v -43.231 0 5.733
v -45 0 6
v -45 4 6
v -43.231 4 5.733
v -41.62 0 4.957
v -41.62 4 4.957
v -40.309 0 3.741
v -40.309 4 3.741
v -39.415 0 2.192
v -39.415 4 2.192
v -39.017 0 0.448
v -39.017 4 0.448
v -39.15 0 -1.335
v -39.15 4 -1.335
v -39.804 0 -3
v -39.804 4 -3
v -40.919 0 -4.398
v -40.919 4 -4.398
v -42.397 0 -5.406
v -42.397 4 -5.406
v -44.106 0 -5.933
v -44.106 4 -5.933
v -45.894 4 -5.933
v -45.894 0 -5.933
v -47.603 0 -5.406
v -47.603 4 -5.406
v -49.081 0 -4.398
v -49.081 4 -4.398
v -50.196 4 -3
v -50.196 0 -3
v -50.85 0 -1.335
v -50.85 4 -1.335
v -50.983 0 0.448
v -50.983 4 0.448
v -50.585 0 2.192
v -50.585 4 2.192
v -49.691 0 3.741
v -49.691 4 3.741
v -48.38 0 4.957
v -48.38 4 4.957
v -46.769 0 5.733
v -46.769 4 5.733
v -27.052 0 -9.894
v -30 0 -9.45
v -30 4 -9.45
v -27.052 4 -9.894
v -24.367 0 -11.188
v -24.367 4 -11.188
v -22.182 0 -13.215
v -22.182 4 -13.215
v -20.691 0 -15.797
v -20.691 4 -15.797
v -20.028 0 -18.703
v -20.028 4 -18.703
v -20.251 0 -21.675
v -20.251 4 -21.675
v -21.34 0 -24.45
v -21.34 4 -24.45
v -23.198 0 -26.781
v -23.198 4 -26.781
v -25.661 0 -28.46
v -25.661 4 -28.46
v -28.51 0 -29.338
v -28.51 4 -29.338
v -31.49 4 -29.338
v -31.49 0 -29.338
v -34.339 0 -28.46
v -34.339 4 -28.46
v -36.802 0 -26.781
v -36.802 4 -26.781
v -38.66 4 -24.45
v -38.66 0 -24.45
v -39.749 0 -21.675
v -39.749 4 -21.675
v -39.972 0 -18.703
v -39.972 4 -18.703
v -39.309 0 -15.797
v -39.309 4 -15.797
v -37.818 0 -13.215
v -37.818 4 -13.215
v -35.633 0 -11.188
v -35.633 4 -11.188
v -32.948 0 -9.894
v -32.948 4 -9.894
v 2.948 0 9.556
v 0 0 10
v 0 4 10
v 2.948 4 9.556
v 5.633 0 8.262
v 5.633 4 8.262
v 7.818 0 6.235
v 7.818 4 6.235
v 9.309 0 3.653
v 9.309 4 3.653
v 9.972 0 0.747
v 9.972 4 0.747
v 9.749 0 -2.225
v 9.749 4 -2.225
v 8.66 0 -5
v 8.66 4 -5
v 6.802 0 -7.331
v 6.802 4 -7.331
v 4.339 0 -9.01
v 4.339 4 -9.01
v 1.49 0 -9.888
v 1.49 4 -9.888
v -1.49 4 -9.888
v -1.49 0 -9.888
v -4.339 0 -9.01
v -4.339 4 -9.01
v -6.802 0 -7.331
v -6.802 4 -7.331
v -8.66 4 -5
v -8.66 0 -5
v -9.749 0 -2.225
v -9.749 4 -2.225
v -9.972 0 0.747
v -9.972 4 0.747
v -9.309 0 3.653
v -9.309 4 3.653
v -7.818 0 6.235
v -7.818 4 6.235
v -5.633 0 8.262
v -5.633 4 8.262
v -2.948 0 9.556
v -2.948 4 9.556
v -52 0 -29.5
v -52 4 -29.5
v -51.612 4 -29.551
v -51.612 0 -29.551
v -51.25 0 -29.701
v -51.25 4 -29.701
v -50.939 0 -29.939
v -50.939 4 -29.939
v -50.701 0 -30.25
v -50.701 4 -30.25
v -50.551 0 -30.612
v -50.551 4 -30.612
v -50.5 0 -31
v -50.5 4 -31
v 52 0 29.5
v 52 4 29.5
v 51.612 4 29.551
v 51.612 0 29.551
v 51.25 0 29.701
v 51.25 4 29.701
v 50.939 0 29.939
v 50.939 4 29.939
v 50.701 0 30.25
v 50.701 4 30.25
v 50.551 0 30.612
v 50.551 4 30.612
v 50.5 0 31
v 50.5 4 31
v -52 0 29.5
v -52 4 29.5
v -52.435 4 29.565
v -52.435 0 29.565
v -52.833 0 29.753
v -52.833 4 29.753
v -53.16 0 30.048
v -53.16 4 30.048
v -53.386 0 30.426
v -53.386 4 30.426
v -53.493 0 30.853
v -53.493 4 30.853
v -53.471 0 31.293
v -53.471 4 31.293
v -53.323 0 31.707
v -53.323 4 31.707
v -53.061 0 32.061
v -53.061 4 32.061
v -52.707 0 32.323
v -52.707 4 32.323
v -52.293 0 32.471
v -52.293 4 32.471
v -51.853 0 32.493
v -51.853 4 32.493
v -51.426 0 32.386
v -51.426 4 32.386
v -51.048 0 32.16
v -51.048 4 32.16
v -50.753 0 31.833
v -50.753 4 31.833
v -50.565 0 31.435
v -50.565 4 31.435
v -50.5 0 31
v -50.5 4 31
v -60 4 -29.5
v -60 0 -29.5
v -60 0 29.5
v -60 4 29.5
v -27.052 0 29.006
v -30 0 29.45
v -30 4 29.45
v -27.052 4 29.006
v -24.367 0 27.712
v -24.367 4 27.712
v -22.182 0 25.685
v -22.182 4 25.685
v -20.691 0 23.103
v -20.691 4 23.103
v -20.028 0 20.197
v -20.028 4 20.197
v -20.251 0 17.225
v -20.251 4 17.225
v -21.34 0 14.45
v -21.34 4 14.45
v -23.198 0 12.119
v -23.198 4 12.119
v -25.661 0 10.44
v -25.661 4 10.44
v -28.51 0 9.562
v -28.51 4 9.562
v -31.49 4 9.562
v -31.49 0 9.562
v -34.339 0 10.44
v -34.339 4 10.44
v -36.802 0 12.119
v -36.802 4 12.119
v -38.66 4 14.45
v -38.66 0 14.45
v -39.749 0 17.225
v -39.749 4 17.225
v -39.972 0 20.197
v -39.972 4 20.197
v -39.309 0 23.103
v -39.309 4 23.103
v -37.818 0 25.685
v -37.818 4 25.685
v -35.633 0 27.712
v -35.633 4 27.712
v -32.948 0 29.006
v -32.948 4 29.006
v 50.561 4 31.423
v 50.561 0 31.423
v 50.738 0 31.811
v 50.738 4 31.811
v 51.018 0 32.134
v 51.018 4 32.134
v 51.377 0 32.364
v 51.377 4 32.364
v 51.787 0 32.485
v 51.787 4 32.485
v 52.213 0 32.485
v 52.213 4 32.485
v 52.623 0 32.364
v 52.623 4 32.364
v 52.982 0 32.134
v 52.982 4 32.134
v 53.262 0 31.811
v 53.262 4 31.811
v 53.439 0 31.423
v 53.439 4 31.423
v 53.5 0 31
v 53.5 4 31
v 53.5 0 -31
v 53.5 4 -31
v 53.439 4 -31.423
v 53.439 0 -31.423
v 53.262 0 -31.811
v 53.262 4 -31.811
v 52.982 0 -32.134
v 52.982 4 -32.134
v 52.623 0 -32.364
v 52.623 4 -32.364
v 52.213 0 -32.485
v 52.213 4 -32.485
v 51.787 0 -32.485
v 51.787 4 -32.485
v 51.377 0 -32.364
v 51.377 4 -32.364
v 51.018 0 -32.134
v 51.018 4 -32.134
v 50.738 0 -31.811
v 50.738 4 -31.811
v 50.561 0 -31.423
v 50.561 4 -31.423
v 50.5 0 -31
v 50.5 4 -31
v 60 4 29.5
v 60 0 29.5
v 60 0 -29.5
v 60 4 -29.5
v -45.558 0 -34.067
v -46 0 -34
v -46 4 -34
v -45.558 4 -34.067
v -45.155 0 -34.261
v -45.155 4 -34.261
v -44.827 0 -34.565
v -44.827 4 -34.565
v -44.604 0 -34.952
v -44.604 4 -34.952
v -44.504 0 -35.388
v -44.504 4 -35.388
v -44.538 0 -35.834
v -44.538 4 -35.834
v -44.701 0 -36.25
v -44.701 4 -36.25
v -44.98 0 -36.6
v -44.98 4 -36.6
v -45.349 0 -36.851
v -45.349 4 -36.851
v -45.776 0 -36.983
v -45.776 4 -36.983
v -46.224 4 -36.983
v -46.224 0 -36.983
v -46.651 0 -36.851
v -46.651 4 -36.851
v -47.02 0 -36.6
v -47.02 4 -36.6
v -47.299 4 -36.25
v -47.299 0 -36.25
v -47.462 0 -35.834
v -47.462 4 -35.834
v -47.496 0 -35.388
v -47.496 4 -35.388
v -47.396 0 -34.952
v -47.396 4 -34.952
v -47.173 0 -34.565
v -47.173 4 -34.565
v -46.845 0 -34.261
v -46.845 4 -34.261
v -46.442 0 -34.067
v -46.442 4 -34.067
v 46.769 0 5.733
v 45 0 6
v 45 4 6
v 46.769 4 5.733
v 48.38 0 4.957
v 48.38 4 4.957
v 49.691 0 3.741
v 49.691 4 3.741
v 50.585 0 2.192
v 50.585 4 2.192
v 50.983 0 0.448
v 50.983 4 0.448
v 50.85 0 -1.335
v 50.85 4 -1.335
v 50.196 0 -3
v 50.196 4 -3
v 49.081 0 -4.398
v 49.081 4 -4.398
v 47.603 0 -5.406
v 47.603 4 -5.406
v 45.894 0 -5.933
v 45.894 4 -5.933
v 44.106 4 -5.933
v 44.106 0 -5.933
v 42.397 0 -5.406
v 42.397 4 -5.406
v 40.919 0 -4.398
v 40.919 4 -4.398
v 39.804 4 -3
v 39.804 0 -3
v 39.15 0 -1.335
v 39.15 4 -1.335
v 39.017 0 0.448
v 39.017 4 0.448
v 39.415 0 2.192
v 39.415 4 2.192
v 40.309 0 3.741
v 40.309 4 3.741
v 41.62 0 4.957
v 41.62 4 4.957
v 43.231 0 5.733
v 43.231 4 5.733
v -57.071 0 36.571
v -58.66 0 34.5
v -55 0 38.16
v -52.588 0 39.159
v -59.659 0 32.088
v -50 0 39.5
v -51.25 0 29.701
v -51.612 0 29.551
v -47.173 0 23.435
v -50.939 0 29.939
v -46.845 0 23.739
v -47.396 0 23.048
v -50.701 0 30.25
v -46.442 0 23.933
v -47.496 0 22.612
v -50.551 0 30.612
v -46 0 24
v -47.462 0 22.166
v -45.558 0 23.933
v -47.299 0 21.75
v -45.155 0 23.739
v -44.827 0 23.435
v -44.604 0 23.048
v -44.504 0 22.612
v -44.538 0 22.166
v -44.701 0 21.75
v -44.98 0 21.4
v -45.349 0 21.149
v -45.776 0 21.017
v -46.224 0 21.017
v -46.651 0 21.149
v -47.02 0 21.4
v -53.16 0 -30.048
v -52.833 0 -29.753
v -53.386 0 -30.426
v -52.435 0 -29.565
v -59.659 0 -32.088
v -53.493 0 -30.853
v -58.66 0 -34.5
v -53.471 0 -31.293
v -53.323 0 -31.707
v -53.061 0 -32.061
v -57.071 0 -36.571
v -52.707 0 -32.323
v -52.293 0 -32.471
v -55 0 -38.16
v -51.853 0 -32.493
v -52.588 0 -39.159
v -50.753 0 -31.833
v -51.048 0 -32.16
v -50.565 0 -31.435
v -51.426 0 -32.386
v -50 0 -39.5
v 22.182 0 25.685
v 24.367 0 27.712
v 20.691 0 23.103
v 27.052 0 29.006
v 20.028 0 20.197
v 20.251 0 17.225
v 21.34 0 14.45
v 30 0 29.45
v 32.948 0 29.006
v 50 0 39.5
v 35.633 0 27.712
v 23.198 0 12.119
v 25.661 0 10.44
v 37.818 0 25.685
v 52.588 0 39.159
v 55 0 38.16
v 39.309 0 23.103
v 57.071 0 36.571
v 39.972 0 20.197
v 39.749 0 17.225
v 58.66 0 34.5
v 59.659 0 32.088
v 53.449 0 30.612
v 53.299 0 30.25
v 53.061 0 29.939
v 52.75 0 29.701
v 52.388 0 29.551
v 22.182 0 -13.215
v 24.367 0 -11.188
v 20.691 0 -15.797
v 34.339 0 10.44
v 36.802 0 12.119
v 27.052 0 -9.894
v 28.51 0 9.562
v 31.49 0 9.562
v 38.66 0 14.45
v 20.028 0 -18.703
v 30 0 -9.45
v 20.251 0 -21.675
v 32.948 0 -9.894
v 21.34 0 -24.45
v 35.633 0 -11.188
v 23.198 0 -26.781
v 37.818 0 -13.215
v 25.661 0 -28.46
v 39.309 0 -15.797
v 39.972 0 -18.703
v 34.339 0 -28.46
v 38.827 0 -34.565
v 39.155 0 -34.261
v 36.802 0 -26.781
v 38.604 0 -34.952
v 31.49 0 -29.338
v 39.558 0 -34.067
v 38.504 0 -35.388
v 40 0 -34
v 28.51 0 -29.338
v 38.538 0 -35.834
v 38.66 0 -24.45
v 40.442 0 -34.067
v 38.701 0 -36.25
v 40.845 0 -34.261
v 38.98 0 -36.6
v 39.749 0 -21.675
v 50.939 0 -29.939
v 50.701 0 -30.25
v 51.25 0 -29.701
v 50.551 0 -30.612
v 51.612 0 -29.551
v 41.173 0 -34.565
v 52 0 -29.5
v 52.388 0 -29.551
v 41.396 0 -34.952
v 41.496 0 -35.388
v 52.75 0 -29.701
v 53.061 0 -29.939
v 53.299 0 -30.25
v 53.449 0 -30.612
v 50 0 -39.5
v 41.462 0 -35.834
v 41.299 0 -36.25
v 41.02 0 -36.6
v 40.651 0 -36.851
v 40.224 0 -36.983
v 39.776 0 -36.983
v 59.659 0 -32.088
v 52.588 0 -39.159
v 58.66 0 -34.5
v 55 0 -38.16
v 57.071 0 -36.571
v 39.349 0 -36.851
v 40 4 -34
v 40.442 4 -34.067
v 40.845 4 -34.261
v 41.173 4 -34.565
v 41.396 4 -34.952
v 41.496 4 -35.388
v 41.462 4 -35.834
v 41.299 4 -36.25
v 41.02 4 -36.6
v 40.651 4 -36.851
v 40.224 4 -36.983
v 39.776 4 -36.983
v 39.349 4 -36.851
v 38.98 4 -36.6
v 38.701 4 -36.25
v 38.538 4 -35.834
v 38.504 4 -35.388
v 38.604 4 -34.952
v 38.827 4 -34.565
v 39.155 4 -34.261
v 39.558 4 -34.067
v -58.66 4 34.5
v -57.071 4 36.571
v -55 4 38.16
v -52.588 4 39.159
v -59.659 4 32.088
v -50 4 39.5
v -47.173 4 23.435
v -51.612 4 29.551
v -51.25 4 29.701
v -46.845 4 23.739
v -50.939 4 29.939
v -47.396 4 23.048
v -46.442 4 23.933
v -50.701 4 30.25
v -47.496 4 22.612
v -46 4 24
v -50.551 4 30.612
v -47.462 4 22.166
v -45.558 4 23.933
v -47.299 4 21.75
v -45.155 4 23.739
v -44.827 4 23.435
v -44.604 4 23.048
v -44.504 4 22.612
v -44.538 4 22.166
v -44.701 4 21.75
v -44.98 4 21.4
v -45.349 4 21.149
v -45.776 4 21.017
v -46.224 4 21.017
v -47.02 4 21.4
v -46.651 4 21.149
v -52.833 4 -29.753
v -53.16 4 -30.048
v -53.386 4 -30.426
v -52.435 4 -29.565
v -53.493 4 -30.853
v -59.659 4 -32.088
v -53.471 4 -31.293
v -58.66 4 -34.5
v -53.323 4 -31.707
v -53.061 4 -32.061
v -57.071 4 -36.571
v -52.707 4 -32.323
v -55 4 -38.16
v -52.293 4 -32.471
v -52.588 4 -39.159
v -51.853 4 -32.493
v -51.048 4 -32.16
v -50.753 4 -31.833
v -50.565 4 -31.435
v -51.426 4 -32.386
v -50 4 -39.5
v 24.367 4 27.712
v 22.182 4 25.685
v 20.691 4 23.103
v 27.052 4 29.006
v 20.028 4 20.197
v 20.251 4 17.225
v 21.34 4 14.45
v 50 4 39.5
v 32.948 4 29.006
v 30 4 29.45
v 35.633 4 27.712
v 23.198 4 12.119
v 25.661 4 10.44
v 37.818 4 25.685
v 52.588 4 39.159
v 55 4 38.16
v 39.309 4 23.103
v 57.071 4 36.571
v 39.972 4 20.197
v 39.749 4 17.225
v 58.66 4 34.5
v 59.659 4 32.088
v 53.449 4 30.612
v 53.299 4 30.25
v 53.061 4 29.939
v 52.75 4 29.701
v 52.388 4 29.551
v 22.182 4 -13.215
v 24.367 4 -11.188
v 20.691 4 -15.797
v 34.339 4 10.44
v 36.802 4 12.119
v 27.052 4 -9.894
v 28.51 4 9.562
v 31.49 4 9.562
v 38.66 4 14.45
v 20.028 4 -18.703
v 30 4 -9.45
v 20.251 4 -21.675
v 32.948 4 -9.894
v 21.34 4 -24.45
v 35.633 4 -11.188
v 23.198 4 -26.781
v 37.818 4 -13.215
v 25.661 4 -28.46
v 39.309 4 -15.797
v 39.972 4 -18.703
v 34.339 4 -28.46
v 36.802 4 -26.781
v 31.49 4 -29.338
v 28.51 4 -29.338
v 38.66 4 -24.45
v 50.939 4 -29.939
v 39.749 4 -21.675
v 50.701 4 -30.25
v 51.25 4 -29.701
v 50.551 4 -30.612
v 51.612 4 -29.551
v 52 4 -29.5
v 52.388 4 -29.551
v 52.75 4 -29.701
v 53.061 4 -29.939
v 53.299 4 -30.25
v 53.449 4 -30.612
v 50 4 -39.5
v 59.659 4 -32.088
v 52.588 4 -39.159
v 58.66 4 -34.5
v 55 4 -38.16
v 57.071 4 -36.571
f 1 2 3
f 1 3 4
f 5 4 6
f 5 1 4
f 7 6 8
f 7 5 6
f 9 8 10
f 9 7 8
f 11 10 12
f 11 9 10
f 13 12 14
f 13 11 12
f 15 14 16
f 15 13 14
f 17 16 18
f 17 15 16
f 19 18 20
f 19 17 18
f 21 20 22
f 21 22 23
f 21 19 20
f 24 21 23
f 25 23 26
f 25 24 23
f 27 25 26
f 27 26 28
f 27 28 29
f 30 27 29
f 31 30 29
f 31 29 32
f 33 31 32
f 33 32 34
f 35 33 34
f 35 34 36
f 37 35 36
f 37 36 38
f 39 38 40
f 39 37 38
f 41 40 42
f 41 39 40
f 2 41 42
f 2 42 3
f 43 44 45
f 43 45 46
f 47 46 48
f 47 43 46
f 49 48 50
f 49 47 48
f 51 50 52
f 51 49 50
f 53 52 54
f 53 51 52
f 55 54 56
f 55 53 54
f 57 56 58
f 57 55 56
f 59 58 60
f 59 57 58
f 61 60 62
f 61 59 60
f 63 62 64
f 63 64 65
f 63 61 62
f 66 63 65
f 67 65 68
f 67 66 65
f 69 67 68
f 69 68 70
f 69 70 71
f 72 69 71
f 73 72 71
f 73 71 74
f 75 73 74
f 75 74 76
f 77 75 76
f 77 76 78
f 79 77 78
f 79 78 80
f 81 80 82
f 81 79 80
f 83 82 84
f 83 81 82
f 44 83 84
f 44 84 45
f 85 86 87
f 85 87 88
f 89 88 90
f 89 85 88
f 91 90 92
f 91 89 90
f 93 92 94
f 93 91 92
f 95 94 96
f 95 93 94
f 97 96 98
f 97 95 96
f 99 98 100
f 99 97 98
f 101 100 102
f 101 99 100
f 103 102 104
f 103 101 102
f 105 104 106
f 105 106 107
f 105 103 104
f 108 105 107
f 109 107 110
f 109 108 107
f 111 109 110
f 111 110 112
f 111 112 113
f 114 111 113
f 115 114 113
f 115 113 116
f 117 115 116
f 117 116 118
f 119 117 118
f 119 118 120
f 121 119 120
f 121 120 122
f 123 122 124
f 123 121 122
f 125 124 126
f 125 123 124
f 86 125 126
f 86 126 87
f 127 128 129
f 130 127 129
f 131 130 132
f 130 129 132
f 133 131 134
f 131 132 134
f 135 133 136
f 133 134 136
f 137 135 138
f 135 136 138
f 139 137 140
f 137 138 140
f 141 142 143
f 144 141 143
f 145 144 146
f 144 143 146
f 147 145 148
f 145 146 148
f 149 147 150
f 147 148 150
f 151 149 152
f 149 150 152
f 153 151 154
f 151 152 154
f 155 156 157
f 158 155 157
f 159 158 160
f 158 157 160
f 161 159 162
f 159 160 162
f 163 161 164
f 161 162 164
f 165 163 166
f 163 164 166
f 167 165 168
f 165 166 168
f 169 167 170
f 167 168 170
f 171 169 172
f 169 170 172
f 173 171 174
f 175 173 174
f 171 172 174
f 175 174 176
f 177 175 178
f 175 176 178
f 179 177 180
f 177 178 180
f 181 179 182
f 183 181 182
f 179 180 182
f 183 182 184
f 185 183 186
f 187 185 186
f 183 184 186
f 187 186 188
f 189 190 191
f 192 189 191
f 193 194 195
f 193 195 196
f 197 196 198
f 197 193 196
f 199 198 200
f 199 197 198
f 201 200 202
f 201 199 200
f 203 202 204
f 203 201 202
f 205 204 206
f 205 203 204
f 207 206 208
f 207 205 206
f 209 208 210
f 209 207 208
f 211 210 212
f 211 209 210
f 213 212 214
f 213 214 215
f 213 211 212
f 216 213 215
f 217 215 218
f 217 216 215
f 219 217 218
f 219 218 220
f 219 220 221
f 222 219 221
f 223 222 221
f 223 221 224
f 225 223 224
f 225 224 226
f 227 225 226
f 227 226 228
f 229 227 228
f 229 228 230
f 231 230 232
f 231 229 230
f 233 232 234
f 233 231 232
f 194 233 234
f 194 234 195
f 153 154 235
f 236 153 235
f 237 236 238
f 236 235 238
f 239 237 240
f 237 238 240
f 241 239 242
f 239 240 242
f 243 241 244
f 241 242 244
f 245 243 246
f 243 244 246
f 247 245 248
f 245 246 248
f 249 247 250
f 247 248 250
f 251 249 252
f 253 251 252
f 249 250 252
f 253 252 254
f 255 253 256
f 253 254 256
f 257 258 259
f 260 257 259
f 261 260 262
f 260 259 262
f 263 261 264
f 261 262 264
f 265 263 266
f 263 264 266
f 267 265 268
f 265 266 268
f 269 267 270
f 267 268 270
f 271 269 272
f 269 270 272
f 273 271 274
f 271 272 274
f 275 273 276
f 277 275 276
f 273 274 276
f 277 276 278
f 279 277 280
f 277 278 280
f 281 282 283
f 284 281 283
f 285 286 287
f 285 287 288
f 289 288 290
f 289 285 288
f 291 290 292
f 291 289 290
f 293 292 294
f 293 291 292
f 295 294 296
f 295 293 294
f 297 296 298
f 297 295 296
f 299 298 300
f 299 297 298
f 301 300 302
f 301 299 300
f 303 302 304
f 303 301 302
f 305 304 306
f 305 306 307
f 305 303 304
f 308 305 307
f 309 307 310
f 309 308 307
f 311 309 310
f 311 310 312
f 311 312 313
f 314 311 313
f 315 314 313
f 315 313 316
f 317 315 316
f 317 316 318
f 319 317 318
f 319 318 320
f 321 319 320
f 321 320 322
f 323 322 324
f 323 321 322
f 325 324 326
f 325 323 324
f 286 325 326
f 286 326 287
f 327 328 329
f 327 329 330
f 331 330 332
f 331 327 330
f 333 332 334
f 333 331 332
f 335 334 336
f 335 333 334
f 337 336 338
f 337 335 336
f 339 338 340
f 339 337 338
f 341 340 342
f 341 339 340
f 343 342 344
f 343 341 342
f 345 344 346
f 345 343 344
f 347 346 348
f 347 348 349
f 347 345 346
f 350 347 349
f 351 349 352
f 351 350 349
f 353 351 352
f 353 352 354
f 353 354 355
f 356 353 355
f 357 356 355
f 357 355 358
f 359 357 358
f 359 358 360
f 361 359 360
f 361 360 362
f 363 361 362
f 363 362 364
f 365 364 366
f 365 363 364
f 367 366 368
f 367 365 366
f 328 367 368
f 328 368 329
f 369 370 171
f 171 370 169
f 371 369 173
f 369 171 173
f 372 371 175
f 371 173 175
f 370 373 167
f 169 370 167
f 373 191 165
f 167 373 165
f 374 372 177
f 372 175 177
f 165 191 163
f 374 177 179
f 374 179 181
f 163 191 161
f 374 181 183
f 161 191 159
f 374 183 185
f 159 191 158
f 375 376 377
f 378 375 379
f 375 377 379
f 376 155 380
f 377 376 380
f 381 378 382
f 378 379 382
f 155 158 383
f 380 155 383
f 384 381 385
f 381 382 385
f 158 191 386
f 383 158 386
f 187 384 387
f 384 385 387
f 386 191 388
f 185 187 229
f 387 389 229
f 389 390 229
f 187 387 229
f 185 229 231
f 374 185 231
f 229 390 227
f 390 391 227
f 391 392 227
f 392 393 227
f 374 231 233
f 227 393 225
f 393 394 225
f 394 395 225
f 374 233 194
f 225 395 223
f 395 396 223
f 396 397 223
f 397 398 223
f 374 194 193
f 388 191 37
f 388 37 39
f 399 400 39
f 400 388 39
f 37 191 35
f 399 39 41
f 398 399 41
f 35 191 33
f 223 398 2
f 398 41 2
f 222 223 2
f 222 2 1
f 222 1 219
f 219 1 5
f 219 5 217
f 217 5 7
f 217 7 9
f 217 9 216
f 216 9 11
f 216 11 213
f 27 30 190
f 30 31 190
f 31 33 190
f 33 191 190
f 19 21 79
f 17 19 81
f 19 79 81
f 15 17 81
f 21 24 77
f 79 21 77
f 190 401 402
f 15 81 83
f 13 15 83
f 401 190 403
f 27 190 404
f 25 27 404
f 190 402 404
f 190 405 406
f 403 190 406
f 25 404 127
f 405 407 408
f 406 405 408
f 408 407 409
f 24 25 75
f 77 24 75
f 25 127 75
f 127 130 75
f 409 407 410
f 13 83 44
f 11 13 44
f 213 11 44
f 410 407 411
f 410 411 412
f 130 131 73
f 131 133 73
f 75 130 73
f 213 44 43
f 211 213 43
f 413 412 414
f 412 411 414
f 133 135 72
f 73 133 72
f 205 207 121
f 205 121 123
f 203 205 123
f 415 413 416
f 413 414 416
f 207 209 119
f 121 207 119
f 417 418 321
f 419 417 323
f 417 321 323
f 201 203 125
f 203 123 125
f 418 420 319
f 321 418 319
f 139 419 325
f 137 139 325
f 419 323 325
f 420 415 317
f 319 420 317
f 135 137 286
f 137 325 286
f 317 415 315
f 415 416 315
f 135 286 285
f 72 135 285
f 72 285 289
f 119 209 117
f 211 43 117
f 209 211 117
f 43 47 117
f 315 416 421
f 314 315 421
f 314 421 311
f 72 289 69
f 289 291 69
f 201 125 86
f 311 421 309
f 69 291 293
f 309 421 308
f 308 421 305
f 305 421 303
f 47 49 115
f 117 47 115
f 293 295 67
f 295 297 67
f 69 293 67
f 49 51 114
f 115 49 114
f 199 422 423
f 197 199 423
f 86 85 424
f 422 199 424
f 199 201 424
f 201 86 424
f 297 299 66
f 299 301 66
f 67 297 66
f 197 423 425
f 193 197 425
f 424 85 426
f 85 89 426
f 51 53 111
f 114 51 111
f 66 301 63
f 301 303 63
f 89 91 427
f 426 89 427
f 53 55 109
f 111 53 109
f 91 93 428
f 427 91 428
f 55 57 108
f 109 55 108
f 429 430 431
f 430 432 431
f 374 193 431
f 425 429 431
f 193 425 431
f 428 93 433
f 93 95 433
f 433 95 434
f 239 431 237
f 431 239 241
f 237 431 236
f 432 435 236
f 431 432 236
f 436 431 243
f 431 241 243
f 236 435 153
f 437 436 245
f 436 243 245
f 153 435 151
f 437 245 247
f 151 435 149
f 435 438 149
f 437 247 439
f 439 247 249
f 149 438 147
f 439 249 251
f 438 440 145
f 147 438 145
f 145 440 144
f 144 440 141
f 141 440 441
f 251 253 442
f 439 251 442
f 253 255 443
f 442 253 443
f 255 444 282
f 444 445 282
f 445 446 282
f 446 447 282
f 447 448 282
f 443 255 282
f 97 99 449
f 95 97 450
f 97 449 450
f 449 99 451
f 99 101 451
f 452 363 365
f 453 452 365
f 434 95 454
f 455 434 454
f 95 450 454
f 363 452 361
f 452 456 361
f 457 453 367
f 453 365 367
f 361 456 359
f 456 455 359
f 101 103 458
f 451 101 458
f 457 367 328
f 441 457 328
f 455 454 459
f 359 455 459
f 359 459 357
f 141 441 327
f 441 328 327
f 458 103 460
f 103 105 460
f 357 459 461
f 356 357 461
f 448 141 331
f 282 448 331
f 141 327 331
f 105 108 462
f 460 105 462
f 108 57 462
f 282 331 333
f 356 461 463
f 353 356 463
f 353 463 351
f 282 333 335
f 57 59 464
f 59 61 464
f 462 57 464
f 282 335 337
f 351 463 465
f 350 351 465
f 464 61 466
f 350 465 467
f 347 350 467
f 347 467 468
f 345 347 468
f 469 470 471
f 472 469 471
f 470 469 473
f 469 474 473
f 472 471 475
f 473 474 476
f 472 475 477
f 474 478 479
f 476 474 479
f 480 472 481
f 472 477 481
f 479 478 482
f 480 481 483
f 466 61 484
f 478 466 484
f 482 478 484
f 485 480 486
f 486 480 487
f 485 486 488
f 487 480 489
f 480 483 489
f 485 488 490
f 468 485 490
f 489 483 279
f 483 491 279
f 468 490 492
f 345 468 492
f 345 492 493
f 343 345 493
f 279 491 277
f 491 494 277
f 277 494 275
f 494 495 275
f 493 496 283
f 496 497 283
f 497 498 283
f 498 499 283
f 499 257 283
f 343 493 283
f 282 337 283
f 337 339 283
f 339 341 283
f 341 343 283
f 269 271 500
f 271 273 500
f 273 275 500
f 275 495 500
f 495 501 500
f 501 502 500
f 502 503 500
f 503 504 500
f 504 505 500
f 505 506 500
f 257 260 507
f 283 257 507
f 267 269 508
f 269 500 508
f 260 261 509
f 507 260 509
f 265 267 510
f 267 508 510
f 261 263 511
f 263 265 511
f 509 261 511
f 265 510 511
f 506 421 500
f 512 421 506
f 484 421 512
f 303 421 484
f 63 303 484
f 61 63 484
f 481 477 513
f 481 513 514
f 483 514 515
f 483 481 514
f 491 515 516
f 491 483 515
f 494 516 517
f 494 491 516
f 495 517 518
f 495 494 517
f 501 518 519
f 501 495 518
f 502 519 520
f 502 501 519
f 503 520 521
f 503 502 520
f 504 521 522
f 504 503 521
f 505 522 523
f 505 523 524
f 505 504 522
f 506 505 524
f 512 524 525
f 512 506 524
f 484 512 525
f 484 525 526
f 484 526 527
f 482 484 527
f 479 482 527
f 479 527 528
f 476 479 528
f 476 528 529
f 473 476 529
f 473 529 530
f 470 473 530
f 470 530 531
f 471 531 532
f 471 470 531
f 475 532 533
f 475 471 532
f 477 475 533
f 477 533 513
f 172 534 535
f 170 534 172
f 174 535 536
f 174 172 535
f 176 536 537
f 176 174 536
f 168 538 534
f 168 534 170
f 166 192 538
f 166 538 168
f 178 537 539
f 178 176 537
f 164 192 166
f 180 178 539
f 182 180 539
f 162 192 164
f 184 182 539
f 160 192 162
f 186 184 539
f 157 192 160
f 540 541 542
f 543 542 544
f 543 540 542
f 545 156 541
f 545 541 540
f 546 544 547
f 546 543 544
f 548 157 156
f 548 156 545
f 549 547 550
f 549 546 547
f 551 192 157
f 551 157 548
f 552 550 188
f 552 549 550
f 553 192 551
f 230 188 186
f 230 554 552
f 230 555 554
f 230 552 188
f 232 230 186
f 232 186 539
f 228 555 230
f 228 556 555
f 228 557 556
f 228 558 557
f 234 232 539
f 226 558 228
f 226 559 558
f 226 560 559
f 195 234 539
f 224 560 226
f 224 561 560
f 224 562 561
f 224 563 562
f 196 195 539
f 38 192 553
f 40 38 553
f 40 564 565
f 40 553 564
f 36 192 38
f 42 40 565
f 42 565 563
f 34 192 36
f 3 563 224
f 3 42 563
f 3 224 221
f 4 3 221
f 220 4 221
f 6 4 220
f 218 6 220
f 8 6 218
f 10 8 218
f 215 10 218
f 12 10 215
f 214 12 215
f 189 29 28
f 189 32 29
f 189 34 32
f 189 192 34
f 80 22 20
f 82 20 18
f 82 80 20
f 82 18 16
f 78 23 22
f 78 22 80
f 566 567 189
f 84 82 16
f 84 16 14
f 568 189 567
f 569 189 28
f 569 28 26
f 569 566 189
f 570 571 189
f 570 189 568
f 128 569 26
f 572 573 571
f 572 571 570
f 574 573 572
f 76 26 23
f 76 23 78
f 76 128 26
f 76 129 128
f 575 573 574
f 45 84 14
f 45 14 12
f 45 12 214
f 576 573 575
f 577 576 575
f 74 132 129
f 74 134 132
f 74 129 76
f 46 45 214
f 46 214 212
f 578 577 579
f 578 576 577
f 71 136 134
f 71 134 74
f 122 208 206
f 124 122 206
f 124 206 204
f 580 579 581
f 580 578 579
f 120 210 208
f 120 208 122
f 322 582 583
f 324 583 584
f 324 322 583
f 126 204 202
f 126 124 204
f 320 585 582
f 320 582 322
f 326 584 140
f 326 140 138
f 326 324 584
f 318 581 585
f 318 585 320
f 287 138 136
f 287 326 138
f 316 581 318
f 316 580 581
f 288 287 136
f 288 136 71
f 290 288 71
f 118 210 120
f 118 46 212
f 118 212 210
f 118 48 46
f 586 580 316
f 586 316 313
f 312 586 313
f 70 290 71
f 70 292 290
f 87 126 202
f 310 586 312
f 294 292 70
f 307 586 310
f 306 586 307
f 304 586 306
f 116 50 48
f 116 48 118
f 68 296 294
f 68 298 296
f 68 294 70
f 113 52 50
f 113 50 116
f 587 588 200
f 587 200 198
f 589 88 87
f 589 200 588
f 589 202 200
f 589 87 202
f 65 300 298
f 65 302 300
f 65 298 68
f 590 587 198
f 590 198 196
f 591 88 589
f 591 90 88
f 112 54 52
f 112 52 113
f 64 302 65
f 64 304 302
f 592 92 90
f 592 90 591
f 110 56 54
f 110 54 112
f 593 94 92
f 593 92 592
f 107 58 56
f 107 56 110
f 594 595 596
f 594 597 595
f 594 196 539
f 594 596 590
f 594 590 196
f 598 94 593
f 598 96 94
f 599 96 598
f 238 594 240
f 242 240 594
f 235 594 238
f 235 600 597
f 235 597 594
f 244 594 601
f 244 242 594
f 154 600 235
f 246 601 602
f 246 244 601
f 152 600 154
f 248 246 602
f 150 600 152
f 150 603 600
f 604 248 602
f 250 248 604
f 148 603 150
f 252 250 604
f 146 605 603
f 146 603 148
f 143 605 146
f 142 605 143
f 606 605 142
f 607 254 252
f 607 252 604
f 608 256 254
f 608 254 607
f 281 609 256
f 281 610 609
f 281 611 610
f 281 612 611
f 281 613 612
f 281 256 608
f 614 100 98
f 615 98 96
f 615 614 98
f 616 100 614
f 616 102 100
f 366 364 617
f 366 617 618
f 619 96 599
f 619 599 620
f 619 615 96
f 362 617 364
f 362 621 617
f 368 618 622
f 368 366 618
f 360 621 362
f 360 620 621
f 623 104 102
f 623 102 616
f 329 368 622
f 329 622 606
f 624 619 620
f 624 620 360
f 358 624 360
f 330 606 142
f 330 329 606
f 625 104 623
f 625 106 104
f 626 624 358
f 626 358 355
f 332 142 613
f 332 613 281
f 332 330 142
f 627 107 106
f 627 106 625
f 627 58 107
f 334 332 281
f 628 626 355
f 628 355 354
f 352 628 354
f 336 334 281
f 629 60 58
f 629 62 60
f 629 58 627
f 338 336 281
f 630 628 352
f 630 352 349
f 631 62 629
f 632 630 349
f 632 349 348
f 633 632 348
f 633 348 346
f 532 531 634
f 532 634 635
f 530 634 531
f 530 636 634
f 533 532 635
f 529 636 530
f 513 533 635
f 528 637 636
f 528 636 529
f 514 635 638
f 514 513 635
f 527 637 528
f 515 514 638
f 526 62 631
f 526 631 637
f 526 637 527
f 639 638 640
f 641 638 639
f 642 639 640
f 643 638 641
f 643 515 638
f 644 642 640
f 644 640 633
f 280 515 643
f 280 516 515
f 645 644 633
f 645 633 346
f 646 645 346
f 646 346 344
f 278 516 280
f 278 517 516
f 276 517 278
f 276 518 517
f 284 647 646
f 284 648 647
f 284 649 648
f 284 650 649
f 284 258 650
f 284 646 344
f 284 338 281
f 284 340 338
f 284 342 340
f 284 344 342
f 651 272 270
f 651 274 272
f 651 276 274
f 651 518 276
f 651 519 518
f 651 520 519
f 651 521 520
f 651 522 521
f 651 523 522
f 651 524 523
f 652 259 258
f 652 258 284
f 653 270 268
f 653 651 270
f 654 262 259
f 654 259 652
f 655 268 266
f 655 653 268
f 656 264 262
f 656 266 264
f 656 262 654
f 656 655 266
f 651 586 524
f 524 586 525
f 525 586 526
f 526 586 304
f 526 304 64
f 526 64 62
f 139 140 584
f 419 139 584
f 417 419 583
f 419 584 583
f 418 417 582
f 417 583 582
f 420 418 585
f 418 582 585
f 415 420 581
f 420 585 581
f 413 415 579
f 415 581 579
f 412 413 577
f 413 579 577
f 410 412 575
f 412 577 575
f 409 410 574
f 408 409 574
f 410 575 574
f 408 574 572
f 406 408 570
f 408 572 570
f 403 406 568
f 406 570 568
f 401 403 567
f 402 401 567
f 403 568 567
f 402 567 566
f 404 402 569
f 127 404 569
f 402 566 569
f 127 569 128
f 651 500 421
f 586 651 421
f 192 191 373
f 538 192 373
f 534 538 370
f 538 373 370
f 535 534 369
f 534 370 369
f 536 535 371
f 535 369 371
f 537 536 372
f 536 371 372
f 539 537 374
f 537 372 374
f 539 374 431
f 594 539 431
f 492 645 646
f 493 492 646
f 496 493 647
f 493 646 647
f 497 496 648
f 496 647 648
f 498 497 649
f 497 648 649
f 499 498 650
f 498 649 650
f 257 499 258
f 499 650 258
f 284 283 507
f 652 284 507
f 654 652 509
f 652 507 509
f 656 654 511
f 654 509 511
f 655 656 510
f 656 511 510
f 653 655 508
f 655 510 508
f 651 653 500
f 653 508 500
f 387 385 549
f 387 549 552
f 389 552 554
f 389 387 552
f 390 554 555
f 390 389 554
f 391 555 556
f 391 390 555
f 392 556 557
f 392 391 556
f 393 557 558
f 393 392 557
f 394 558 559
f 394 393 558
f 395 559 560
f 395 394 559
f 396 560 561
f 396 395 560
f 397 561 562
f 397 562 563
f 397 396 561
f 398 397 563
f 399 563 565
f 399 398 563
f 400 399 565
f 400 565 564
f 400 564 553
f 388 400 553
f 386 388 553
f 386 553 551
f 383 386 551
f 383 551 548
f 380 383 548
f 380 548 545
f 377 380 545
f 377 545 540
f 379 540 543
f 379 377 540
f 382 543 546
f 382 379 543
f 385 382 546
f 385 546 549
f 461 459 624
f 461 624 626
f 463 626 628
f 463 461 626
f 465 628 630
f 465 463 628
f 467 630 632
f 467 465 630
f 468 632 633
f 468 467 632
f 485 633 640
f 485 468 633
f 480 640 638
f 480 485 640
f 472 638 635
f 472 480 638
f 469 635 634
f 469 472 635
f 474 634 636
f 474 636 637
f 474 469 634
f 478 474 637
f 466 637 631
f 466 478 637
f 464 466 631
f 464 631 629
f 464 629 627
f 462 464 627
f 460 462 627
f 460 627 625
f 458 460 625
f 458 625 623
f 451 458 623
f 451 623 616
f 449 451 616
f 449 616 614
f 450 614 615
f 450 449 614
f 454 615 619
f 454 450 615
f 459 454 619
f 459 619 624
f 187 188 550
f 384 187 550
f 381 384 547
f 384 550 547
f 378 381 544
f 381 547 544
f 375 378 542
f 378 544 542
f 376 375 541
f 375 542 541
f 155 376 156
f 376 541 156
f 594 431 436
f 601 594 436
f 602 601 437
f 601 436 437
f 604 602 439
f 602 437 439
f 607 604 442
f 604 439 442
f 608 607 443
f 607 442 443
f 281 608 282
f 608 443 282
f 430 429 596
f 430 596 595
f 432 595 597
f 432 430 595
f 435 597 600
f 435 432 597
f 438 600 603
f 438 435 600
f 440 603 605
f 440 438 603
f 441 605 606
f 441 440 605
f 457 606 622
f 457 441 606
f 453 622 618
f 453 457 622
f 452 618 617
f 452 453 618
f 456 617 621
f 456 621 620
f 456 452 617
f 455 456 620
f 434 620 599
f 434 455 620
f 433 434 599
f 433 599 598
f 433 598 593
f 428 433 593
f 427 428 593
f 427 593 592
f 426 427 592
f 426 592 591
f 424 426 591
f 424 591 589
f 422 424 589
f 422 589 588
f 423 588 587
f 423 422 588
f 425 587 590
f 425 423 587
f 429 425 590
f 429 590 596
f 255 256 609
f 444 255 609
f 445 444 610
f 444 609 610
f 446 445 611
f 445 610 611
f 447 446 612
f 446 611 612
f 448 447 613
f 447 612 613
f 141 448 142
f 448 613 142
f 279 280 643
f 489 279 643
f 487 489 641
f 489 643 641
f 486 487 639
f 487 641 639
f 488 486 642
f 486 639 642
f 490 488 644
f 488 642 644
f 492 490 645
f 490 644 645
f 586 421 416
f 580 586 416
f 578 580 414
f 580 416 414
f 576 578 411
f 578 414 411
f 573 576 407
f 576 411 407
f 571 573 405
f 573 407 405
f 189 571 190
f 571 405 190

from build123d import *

# Parameters (mm, degrees)
SKETCH1_R           = 1.5
SKETCH1_R_2         = 6
SKETCH1_R_3         = 10
BOSS_EXTRUDE1_DEPTH = 4
CUT_EXTRUDE1_DEPTH  = 25


with BuildPart() as part:
    # Sketch1 → Boss-Extrude1 (new body)
    with BuildSketch(Plane(origin=(0, 0, 0), x_dir=(1, 0, 0), z_dir=(0, 1, 0))):
        with BuildLine():
            Line((-50, -39.5), (50, -39.5))
            ThreePointArc((50, -39.5), (57.071067812, -36.571067812), (60, -29.5))
            Line((60, -29.5), (60, 29.5))
            ThreePointArc((60, 29.5), (57.071067812, 36.571067812), (50, 39.5))
            Line((50, 39.5), (-50, 39.5))
            ThreePointArc((-50, 39.5), (-57.071067812, 36.571067812), (-60, 29.5))
            Line((-60, 29.5), (-60, -29.5))
            ThreePointArc((-60, -29.5), (-57.071067812, -36.571067812), (-50, -39.5))
        make_face()
        with Locations(Location((40, 35.5, 0), (0, 0, 270))):
            Circle(SKETCH1_R, mode=Mode.SUBTRACT)
        with Locations(Location((45, 0, 0), (0, 0, 270))):
            Circle(SKETCH1_R_2, mode=Mode.SUBTRACT)
        with Locations(Location((30, 19.45, 0), (0, 0, 270))):
            Circle(SKETCH1_R_3, mode=Mode.SUBTRACT)
        with Locations(Location((30, -19.45, 0), (0, 0, 270))):
            Circle(SKETCH1_R_3, mode=Mode.SUBTRACT)
        with Locations(Location((0, 0, 0), (0, 0, 270))):
            Circle(SKETCH1_R_3, mode=Mode.SUBTRACT)
        with Locations(Location((-30, -19.45, 0), (0, 0, 270))):
            Circle(SKETCH1_R_3, mode=Mode.SUBTRACT)
        with Locations(Location((-46, 35.5, 0), (0, 0, 270))):
            Circle(SKETCH1_R, mode=Mode.SUBTRACT)
        with Locations(Location((-46, -22.5, 0), (0, 0, 270))):
            Circle(SKETCH1_R, mode=Mode.SUBTRACT)
        with Locations(Location((-45, 0, 0), (0, 0, 270))):
            Circle(SKETCH1_R_2, mode=Mode.SUBTRACT)
        with Locations(Location((-30, 19.45, 0), (0, 0, 270))):
            Circle(SKETCH1_R_3, mode=Mode.SUBTRACT)
    extrude(amount=BOSS_EXTRUDE1_DEPTH)

    # Sketch2 → Cut-Extrude1 (cut)
    with BuildSketch(Plane(origin=(0, 4, 0), x_dir=(1, 0, 0), z_dir=(0, 1, 0))):
        with BuildLine():
            ThreePointArc((-50.5, 31), (-53.060660172, 32.060660172), (-52, 29.5))
            Line((-52, 29.5), (-52, 31))
            Line((-52, 31), (-50.5, 31))
        make_face()
        with BuildLine():
            Line((-52, 31), (-52, 29.5))
            ThreePointArc((-52, 29.5), (-50.939339828, 29.939339828), (-50.5, 31))
            Line((-50.5, 31), (-52, 31))
        make_face()
        with BuildLine():
            ThreePointArc((-52, -29.5), (-53.060660172, -32.060660172), (-50.5, -31))
            Line((-50.5, -31), (-52, -31))
            Line((-52, -31), (-52, -29.5))
        make_face()
        with BuildLine():
            Line((-52, -31), (-50.5, -31))
            ThreePointArc((-50.5, -31), (-50.939339828, -29.939339828), (-52, -29.5))
            Line((-52, -29.5), (-52, -31))
        make_face()
        with BuildLine():
            ThreePointArc((52, -29.5), (50.939339828, -29.939339828), (50.5, -31))
            Line((50.5, -31), (52, -31))
            Line((52, -31), (52, -29.5))
        make_face()
        with BuildLine():
            Line((52, -31), (50.5, -31))
            ThreePointArc((50.5, -31), (52, -32.5), (53.5, -31))
            ThreePointArc((53.5, -31), (53.060660172, -29.939339828), (52, -29.5))
            Line((52, -29.5), (52, -31))
        make_face()
        with BuildLine():
            ThreePointArc((50.5, 31), (50.939339828, 29.939339828), (52, 29.5))
            Line((52, 29.5), (52, 31))
            Line((52, 31), (50.5, 31))
        make_face()
        with BuildLine():
            Line((52, 31), (52, 29.5))
            ThreePointArc((52, 29.5), (53.060660172, 29.939339828), (53.5, 31))
            ThreePointArc((53.5, 31), (52, 32.5), (50.5, 31))
            Line((50.5, 31), (52, 31))
        make_face()
    extrude(amount=-CUT_EXTRUDE1_DEPTH, mode=Mode.SUBTRACT)


solid = part.part
